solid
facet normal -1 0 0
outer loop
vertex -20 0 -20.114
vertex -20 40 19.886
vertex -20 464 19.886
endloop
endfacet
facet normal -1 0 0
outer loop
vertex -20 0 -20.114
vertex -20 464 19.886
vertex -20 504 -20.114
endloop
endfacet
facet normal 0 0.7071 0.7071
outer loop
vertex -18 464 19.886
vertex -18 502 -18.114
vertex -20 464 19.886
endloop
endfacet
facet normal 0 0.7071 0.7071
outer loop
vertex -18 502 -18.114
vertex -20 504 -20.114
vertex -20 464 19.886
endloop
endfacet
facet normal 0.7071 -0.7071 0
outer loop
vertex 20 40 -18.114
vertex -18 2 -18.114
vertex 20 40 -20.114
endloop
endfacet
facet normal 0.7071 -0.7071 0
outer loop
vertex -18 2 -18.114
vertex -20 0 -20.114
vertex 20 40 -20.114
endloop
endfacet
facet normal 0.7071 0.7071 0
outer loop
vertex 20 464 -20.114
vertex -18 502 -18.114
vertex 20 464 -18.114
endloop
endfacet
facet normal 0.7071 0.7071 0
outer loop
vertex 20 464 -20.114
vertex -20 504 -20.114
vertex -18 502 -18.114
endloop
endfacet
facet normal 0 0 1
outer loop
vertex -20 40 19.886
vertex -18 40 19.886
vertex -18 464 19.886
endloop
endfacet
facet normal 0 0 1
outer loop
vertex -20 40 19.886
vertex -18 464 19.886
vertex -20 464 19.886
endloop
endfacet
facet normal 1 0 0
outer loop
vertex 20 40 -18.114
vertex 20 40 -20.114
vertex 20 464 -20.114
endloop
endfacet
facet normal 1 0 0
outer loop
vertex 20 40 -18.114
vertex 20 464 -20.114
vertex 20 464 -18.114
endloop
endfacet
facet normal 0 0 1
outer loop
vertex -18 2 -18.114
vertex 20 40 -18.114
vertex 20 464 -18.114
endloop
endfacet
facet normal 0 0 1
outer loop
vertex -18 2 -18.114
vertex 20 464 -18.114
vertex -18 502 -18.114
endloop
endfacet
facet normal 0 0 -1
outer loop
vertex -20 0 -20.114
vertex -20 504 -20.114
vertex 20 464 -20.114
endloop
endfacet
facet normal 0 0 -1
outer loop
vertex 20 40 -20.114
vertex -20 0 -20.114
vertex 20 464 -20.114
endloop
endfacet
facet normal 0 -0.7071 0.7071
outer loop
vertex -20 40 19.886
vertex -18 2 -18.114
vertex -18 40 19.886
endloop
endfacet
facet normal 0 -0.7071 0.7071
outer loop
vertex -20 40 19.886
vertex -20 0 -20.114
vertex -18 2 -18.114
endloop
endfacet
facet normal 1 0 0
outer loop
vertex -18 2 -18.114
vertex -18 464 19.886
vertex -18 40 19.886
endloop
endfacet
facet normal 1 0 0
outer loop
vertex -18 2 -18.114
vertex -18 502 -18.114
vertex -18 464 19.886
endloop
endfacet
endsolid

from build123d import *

# Parameters (mm, degrees)
BOSS_EXTRU_1_DEPTH      = 504
ENL_V_MAT_EXTRU_1_DEPTH = 590
ENL_V_MAT_EXTRU_2_DEPTH = 590
ENL_V_MAT_EXTRU_3_DEPTH = 41
ENL_V_MAT_EXTRU_4_DEPTH = 41


with BuildPart() as part:
    # Esquisse1 → Boss.-Extru.1 (new body)
    with BuildSketch(Plane(origin=(0, 0, 0), x_dir=(1, 0, 0), z_dir=(0, 1, 0))):
        Polygon((-20, 20.113636364), (20, 20.113636364), (20, 18.113636364), (-18, 18.113636364), (-18, -19.886363636), (-20, -19.886363636), align=None)
    extrude(amount=BOSS_EXTRU_1_DEPTH)

    # Esquisse2 → Enlèv. mat.-Extru.1 (cut)
    with BuildSketch(Plane(origin=(0, 0, -20.113636364), x_dir=(-1, 0, 0), z_dir=(0, 0, -1))):
        Polygon((20, 0), (-20, 40), (-20, 0), align=None)
    extrude(amount=-ENL_V_MAT_EXTRU_1_DEPTH, mode=Mode.SUBTRACT)

    # Esquisse3 → Enlèv. mat.-Extru.2 (cut)
    with BuildSketch(Plane.ZY.offset(20)):
        Polygon((-20.113636364, 0), (19.886363636, 40), (19.886363636, 0), align=None)
    extrude(amount=-ENL_V_MAT_EXTRU_2_DEPTH, mode=Mode.SUBTRACT)

    # Esquisse4 → Enlèv. mat.-Extru.3 (cut, through all)
    with BuildSketch(Plane.ZY.offset(20)):
        Polygon((-20.113636364, 504), (19.886363636, 464), (19.886363636, 504), align=None)
    extrude(amount=-ENL_V_MAT_EXTRU_3_DEPTH, mode=Mode.SUBTRACT)

    # Esquisse5 → Enlèv. mat.-Extru.4 (cut, through all)
    with BuildSketch(Plane(origin=(0, 0, -20.113636364), x_dir=(-1, 0, 0), z_dir=(0, 0, -1))):
        Polygon((20, 504), (-20, 464), (-20, 504), align=None)
    extrude(amount=-ENL_V_MAT_EXTRU_4_DEPTH, mode=Mode.SUBTRACT)


solid = part.part
